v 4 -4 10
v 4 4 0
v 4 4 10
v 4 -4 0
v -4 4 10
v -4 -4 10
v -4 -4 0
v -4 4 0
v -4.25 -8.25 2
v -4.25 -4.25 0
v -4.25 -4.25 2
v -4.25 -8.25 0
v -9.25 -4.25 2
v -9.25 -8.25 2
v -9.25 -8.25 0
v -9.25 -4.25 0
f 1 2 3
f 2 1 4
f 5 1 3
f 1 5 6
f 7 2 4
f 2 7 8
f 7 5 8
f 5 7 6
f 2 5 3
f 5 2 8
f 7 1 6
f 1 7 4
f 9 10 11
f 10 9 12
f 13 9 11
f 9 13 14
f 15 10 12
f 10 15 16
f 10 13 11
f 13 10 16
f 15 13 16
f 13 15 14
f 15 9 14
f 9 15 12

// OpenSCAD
translate([0, 0, 5]) color([0,1,0,0.9]) cube([8, 8, 10], center=true);
translate([-4.5, -4.5, 1]) color([1,0,0]) cube([0.5, 0.5, 2], center=true);
translate([-5.0, -4.5, 1]) color([1,0,0]) cube([0.5, 0.5, 2], center=true);
translate([-5.5, -4.5, 1]) color([1,0,0]) cube([0.5, 0.5, 2], center=true);
translate([-6.0, -4.5, 1]) color([1,0,0]) cube([0.5, 0.5, 2], center=true);
translate([-6.5, -4.5, 1]) color([1,0,0]) cube([0.5, 0.5, 2], center=true);
translate([-7.0, -4.5, 1]) color([1,0,0]) cube([0.5, 0.5, 2], center=true);
translate([-7.5, -4.5, 1]) color([1,0,0]) cube([0.5, 0.5, 2], center=true);
translate([-8.0, -4.5, 1]) color([1,0,0]) cube([0.5, 0.5, 2], center=true);
translate([-8.5, -4.5, 1]) color([1,0,0]) cube([0.5, 0.5, 2], center=true);
translate([-9.0, -4.5, 1]) color([1,0,0]) cube([0.5, 0.5, 2], center=true);
translate([-4.5, -5.0, 1]) color([1,0,0]) cube([0.5, 0.5, 2], center=true);
translate([-5.0, -5.0, 1]) color([1,0,0]) cube([0.5, 0.5, 2], center=true);
translate([-5.5, -5.0, 1]) color([1,0,0]) cube([0.5, 0.5, 2], center=true);
translate([-6.0, -5.0, 1]) color([1,0,0]) cube([0.5, 0.5, 2], center=true);
translate([-6.5, -5.0, 1]) color([1,0,0]) cube([0.5, 0.5, 2], center=true);
translate([-7.0, -5.0, 1]) color([1,0,0]) cube([0.5, 0.5, 2], center=true);
translate([-7.5, -5.0, 1]) color([1,0,0]) cube([0.5, 0.5, 2], center=true);
translate([-8.0, -5.0, 1]) color([1,0,0]) cube([0.5, 0.5, 2], center=true);
translate([-8.5, -5.0, 1]) color([1,0,0]) cube([0.5, 0.5, 2], center=true);
translate([-9.0, -5.0, 1]) color([1,0,0]) cube([0.5, 0.5, 2], center=true);
translate([-4.5, -5.5, 1]) color([1,0,0]) cube([0.5, 0.5, 2], center=true);
translate([-5.0, -5.5, 1]) color([1,0,0]) cube([0.5, 0.5, 2], center=true);
translate([-5.5, -5.5, 1]) color([1,0,0]) cube([0.5, 0.5, 2], center=true);
translate([-6.0, -5.5, 1]) color([1,0,0]) cube([0.5, 0.5, 2], center=true);
translate([-6.5, -5.5, 1]) color([1,0,0]) cube([0.5, 0.5, 2], center=true);
translate([-7.0, -5.5, 1]) color([1,0,0]) cube([0.5, 0.5, 2], center=true);
translate([-7.5, -5.5, 1]) color([1,0,0]) cube([0.5, 0.5, 2], center=true);
translate([-8.0, -5.5, 1]) color([1,0,0]) cube([0.5, 0.5, 2], center=true);
translate([-8.5, -5.5, 1]) color([1,0,0]) cube([0.5, 0.5, 2], center=true);
translate([-9.0, -5.5, 1]) color([1,0,0]) cube([0.5, 0.5, 2], center=true);
translate([-4.5, -6.0, 1]) color([1,0,0]) cube([0.5, 0.5, 2], center=true);
translate([-5.0, -6.0, 1]) color([1,0,0]) cube([0.5, 0.5, 2], center=true);
translate([-5.5, -6.0, 1]) color([1,0,0]) cube([0.5, 0.5, 2], center=true);
translate([-6.0, -6.0, 1]) color([1,0,0]) cube([0.5, 0.5, 2], center=true);
translate([-6.5, -6.0, 1]) color([1,0,0]) cube([0.5, 0.5, 2], center=true);
translate([-7.0, -6.0, 1]) color([1,0,0]) cube([0.5, 0.5, 2], center=true);
translate([-7.5, -6.0, 1]) color([1,0,0]) cube([0.5, 0.5, 2], center=true);
translate([-8.0, -6.0, 1]) color([1,0,0]) cube([0.5, 0.5, 2], center=true);
translate([-8.5, -6.0, 1]) color([1,0,0]) cube([0.5, 0.5, 2], center=true);
translate([-9.0, -6.0, 1]) color([1,0,0]) cube([0.5, 0.5, 2], center=true);
translate([-4.5, -6.5, 1]) color([1,0,0]) cube([0.5, 0.5, 2], center=true);
translate([-5.0, -6.5, 1]) color([1,0,0]) cube([0.5, 0.5, 2], center=true);
translate([-5.5, -6.5, 1]) color([1,0,0]) cube([0.5, 0.5, 2], center=true);
translate([-6.0, -6.5, 1]) color([1,0,0]) cube([0.5, 0.5, 2], center=true);
translate([-6.5, -6.5, 1]) color([1,0,0]) cube([0.5, 0.5, 2], center=true);
translate([-7.0, -6.5, 1]) color([1,0,0]) cube([0.5, 0.5, 2], center=true);
translate([-7.5, -6.5, 1]) color([1,0,0]) cube([0.5, 0.5, 2], center=true);
translate([-8.0, -6.5, 1]) color([1,0,0]) cube([0.5, 0.5, 2], center=true);
translate([-8.5, -6.5, 1]) color([1,0,0]) cube([0.5, 0.5, 2], center=true);
translate([-9.0, -6.5, 1]) color([1,0,0]) cube([0.5, 0.5, 2], center=true);
translate([-4.5, -7.0, 1]) color([1,0,0]) cube([0.5, 0.5, 2], center=true);
translate([-5.0, -7.0, 1]) color([1,0,0]) cube([0.5, 0.5, 2], center=true);
translate([-5.5, -7.0, 1]) color([1,0,0]) cube([0.5, 0.5, 2], center=true);
translate([-6.0, -7.0, 1]) color([1,0,0]) cube([0.5, 0.5, 2], center=true);
translate([-6.5, -7.0, 1]) color([1,0,0]) cube([0.5, 0.5, 2], center=true);
translate([-7.0, -7.0, 1]) color([1,0,0]) cube([0.5, 0.5, 2], center=true);
translate([-7.5, -7.0, 1]) color([1,0,0]) cube([0.5, 0.5, 2], center=true);
translate([-8.0, -7.0, 1]) color([1,0,0]) cube([0.5, 0.5, 2], center=true);
translate([-8.5, -7.0, 1]) color([1,0,0]) cube([0.5, 0.5, 2], center=true);
translate([-9.0, -7.0, 1]) color([1,0,0]) cube([0.5, 0.5, 2], center=true);
translate([-4.5, -7.5, 1]) color([1,0,0]) cube([0.5, 0.5, 2], center=true);
translate([-5.0, -7.5, 1]) color([1,0,0]) cube([0.5, 0.5, 2], center=true);
translate([-5.5, -7.5, 1]) color([1,0,0]) cube([0.5, 0.5, 2], center=true);
translate([-6.0, -7.5, 1]) color([1,0,0]) cube([0.5, 0.5, 2], center=true);
translate([-6.5, -7.5, 1]) color([1,0,0]) cube([0.5, 0.5, 2], center=true);
translate([-7.0, -7.5, 1]) color([1,0,0]) cube([0.5, 0.5, 2], center=true);
translate([-7.5, -7.5, 1]) color([1,0,0]) cube([0.5, 0.5, 2], center=true);
translate([-8.0, -7.5, 1]) color([1,0,0]) cube([0.5, 0.5, 2], center=true);
translate([-8.5, -7.5, 1]) color([1,0,0]) cube([0.5, 0.5, 2], center=true);
translate([-9.0, -7.5, 1]) color([1,0,0]) cube([0.5, 0.5, 2], center=true);
translate([-4.5, -8.0, 1]) color([1,0,0]) cube([0.5, 0.5, 2], center=true);
translate([-5.0, -8.0, 1]) color([1,0,0]) cube([0.5, 0.5, 2], center=true);
translate([-5.5, -8.0, 1]) color([1,0,0]) cube([0.5, 0.5, 2], center=true);
translate([-6.0, -8.0, 1]) color([1,0,0]) cube([0.5, 0.5, 2], center=true);
translate([-6.5, -8.0, 1]) color([1,0,0]) cube([0.5, 0.5, 2], center=true);
translate([-7.0, -8.0, 1]) color([1,0,0]) cube([0.5, 0.5, 2], center=true);
translate([-7.5, -8.0, 1]) color([1,0,0]) cube([0.5, 0.5, 2], center=true);
translate([-8.0, -8.0, 1]) color([1,0,0]) cube([0.5, 0.5, 2], center=true);
translate([-8.5, -8.0, 1]) color([1,0,0]) cube([0.5, 0.5, 2], center=true);
translate([-9.0, -8.0, 1]) color([1,0,0]) cube([0.5, 0.5, 2], center=true);
